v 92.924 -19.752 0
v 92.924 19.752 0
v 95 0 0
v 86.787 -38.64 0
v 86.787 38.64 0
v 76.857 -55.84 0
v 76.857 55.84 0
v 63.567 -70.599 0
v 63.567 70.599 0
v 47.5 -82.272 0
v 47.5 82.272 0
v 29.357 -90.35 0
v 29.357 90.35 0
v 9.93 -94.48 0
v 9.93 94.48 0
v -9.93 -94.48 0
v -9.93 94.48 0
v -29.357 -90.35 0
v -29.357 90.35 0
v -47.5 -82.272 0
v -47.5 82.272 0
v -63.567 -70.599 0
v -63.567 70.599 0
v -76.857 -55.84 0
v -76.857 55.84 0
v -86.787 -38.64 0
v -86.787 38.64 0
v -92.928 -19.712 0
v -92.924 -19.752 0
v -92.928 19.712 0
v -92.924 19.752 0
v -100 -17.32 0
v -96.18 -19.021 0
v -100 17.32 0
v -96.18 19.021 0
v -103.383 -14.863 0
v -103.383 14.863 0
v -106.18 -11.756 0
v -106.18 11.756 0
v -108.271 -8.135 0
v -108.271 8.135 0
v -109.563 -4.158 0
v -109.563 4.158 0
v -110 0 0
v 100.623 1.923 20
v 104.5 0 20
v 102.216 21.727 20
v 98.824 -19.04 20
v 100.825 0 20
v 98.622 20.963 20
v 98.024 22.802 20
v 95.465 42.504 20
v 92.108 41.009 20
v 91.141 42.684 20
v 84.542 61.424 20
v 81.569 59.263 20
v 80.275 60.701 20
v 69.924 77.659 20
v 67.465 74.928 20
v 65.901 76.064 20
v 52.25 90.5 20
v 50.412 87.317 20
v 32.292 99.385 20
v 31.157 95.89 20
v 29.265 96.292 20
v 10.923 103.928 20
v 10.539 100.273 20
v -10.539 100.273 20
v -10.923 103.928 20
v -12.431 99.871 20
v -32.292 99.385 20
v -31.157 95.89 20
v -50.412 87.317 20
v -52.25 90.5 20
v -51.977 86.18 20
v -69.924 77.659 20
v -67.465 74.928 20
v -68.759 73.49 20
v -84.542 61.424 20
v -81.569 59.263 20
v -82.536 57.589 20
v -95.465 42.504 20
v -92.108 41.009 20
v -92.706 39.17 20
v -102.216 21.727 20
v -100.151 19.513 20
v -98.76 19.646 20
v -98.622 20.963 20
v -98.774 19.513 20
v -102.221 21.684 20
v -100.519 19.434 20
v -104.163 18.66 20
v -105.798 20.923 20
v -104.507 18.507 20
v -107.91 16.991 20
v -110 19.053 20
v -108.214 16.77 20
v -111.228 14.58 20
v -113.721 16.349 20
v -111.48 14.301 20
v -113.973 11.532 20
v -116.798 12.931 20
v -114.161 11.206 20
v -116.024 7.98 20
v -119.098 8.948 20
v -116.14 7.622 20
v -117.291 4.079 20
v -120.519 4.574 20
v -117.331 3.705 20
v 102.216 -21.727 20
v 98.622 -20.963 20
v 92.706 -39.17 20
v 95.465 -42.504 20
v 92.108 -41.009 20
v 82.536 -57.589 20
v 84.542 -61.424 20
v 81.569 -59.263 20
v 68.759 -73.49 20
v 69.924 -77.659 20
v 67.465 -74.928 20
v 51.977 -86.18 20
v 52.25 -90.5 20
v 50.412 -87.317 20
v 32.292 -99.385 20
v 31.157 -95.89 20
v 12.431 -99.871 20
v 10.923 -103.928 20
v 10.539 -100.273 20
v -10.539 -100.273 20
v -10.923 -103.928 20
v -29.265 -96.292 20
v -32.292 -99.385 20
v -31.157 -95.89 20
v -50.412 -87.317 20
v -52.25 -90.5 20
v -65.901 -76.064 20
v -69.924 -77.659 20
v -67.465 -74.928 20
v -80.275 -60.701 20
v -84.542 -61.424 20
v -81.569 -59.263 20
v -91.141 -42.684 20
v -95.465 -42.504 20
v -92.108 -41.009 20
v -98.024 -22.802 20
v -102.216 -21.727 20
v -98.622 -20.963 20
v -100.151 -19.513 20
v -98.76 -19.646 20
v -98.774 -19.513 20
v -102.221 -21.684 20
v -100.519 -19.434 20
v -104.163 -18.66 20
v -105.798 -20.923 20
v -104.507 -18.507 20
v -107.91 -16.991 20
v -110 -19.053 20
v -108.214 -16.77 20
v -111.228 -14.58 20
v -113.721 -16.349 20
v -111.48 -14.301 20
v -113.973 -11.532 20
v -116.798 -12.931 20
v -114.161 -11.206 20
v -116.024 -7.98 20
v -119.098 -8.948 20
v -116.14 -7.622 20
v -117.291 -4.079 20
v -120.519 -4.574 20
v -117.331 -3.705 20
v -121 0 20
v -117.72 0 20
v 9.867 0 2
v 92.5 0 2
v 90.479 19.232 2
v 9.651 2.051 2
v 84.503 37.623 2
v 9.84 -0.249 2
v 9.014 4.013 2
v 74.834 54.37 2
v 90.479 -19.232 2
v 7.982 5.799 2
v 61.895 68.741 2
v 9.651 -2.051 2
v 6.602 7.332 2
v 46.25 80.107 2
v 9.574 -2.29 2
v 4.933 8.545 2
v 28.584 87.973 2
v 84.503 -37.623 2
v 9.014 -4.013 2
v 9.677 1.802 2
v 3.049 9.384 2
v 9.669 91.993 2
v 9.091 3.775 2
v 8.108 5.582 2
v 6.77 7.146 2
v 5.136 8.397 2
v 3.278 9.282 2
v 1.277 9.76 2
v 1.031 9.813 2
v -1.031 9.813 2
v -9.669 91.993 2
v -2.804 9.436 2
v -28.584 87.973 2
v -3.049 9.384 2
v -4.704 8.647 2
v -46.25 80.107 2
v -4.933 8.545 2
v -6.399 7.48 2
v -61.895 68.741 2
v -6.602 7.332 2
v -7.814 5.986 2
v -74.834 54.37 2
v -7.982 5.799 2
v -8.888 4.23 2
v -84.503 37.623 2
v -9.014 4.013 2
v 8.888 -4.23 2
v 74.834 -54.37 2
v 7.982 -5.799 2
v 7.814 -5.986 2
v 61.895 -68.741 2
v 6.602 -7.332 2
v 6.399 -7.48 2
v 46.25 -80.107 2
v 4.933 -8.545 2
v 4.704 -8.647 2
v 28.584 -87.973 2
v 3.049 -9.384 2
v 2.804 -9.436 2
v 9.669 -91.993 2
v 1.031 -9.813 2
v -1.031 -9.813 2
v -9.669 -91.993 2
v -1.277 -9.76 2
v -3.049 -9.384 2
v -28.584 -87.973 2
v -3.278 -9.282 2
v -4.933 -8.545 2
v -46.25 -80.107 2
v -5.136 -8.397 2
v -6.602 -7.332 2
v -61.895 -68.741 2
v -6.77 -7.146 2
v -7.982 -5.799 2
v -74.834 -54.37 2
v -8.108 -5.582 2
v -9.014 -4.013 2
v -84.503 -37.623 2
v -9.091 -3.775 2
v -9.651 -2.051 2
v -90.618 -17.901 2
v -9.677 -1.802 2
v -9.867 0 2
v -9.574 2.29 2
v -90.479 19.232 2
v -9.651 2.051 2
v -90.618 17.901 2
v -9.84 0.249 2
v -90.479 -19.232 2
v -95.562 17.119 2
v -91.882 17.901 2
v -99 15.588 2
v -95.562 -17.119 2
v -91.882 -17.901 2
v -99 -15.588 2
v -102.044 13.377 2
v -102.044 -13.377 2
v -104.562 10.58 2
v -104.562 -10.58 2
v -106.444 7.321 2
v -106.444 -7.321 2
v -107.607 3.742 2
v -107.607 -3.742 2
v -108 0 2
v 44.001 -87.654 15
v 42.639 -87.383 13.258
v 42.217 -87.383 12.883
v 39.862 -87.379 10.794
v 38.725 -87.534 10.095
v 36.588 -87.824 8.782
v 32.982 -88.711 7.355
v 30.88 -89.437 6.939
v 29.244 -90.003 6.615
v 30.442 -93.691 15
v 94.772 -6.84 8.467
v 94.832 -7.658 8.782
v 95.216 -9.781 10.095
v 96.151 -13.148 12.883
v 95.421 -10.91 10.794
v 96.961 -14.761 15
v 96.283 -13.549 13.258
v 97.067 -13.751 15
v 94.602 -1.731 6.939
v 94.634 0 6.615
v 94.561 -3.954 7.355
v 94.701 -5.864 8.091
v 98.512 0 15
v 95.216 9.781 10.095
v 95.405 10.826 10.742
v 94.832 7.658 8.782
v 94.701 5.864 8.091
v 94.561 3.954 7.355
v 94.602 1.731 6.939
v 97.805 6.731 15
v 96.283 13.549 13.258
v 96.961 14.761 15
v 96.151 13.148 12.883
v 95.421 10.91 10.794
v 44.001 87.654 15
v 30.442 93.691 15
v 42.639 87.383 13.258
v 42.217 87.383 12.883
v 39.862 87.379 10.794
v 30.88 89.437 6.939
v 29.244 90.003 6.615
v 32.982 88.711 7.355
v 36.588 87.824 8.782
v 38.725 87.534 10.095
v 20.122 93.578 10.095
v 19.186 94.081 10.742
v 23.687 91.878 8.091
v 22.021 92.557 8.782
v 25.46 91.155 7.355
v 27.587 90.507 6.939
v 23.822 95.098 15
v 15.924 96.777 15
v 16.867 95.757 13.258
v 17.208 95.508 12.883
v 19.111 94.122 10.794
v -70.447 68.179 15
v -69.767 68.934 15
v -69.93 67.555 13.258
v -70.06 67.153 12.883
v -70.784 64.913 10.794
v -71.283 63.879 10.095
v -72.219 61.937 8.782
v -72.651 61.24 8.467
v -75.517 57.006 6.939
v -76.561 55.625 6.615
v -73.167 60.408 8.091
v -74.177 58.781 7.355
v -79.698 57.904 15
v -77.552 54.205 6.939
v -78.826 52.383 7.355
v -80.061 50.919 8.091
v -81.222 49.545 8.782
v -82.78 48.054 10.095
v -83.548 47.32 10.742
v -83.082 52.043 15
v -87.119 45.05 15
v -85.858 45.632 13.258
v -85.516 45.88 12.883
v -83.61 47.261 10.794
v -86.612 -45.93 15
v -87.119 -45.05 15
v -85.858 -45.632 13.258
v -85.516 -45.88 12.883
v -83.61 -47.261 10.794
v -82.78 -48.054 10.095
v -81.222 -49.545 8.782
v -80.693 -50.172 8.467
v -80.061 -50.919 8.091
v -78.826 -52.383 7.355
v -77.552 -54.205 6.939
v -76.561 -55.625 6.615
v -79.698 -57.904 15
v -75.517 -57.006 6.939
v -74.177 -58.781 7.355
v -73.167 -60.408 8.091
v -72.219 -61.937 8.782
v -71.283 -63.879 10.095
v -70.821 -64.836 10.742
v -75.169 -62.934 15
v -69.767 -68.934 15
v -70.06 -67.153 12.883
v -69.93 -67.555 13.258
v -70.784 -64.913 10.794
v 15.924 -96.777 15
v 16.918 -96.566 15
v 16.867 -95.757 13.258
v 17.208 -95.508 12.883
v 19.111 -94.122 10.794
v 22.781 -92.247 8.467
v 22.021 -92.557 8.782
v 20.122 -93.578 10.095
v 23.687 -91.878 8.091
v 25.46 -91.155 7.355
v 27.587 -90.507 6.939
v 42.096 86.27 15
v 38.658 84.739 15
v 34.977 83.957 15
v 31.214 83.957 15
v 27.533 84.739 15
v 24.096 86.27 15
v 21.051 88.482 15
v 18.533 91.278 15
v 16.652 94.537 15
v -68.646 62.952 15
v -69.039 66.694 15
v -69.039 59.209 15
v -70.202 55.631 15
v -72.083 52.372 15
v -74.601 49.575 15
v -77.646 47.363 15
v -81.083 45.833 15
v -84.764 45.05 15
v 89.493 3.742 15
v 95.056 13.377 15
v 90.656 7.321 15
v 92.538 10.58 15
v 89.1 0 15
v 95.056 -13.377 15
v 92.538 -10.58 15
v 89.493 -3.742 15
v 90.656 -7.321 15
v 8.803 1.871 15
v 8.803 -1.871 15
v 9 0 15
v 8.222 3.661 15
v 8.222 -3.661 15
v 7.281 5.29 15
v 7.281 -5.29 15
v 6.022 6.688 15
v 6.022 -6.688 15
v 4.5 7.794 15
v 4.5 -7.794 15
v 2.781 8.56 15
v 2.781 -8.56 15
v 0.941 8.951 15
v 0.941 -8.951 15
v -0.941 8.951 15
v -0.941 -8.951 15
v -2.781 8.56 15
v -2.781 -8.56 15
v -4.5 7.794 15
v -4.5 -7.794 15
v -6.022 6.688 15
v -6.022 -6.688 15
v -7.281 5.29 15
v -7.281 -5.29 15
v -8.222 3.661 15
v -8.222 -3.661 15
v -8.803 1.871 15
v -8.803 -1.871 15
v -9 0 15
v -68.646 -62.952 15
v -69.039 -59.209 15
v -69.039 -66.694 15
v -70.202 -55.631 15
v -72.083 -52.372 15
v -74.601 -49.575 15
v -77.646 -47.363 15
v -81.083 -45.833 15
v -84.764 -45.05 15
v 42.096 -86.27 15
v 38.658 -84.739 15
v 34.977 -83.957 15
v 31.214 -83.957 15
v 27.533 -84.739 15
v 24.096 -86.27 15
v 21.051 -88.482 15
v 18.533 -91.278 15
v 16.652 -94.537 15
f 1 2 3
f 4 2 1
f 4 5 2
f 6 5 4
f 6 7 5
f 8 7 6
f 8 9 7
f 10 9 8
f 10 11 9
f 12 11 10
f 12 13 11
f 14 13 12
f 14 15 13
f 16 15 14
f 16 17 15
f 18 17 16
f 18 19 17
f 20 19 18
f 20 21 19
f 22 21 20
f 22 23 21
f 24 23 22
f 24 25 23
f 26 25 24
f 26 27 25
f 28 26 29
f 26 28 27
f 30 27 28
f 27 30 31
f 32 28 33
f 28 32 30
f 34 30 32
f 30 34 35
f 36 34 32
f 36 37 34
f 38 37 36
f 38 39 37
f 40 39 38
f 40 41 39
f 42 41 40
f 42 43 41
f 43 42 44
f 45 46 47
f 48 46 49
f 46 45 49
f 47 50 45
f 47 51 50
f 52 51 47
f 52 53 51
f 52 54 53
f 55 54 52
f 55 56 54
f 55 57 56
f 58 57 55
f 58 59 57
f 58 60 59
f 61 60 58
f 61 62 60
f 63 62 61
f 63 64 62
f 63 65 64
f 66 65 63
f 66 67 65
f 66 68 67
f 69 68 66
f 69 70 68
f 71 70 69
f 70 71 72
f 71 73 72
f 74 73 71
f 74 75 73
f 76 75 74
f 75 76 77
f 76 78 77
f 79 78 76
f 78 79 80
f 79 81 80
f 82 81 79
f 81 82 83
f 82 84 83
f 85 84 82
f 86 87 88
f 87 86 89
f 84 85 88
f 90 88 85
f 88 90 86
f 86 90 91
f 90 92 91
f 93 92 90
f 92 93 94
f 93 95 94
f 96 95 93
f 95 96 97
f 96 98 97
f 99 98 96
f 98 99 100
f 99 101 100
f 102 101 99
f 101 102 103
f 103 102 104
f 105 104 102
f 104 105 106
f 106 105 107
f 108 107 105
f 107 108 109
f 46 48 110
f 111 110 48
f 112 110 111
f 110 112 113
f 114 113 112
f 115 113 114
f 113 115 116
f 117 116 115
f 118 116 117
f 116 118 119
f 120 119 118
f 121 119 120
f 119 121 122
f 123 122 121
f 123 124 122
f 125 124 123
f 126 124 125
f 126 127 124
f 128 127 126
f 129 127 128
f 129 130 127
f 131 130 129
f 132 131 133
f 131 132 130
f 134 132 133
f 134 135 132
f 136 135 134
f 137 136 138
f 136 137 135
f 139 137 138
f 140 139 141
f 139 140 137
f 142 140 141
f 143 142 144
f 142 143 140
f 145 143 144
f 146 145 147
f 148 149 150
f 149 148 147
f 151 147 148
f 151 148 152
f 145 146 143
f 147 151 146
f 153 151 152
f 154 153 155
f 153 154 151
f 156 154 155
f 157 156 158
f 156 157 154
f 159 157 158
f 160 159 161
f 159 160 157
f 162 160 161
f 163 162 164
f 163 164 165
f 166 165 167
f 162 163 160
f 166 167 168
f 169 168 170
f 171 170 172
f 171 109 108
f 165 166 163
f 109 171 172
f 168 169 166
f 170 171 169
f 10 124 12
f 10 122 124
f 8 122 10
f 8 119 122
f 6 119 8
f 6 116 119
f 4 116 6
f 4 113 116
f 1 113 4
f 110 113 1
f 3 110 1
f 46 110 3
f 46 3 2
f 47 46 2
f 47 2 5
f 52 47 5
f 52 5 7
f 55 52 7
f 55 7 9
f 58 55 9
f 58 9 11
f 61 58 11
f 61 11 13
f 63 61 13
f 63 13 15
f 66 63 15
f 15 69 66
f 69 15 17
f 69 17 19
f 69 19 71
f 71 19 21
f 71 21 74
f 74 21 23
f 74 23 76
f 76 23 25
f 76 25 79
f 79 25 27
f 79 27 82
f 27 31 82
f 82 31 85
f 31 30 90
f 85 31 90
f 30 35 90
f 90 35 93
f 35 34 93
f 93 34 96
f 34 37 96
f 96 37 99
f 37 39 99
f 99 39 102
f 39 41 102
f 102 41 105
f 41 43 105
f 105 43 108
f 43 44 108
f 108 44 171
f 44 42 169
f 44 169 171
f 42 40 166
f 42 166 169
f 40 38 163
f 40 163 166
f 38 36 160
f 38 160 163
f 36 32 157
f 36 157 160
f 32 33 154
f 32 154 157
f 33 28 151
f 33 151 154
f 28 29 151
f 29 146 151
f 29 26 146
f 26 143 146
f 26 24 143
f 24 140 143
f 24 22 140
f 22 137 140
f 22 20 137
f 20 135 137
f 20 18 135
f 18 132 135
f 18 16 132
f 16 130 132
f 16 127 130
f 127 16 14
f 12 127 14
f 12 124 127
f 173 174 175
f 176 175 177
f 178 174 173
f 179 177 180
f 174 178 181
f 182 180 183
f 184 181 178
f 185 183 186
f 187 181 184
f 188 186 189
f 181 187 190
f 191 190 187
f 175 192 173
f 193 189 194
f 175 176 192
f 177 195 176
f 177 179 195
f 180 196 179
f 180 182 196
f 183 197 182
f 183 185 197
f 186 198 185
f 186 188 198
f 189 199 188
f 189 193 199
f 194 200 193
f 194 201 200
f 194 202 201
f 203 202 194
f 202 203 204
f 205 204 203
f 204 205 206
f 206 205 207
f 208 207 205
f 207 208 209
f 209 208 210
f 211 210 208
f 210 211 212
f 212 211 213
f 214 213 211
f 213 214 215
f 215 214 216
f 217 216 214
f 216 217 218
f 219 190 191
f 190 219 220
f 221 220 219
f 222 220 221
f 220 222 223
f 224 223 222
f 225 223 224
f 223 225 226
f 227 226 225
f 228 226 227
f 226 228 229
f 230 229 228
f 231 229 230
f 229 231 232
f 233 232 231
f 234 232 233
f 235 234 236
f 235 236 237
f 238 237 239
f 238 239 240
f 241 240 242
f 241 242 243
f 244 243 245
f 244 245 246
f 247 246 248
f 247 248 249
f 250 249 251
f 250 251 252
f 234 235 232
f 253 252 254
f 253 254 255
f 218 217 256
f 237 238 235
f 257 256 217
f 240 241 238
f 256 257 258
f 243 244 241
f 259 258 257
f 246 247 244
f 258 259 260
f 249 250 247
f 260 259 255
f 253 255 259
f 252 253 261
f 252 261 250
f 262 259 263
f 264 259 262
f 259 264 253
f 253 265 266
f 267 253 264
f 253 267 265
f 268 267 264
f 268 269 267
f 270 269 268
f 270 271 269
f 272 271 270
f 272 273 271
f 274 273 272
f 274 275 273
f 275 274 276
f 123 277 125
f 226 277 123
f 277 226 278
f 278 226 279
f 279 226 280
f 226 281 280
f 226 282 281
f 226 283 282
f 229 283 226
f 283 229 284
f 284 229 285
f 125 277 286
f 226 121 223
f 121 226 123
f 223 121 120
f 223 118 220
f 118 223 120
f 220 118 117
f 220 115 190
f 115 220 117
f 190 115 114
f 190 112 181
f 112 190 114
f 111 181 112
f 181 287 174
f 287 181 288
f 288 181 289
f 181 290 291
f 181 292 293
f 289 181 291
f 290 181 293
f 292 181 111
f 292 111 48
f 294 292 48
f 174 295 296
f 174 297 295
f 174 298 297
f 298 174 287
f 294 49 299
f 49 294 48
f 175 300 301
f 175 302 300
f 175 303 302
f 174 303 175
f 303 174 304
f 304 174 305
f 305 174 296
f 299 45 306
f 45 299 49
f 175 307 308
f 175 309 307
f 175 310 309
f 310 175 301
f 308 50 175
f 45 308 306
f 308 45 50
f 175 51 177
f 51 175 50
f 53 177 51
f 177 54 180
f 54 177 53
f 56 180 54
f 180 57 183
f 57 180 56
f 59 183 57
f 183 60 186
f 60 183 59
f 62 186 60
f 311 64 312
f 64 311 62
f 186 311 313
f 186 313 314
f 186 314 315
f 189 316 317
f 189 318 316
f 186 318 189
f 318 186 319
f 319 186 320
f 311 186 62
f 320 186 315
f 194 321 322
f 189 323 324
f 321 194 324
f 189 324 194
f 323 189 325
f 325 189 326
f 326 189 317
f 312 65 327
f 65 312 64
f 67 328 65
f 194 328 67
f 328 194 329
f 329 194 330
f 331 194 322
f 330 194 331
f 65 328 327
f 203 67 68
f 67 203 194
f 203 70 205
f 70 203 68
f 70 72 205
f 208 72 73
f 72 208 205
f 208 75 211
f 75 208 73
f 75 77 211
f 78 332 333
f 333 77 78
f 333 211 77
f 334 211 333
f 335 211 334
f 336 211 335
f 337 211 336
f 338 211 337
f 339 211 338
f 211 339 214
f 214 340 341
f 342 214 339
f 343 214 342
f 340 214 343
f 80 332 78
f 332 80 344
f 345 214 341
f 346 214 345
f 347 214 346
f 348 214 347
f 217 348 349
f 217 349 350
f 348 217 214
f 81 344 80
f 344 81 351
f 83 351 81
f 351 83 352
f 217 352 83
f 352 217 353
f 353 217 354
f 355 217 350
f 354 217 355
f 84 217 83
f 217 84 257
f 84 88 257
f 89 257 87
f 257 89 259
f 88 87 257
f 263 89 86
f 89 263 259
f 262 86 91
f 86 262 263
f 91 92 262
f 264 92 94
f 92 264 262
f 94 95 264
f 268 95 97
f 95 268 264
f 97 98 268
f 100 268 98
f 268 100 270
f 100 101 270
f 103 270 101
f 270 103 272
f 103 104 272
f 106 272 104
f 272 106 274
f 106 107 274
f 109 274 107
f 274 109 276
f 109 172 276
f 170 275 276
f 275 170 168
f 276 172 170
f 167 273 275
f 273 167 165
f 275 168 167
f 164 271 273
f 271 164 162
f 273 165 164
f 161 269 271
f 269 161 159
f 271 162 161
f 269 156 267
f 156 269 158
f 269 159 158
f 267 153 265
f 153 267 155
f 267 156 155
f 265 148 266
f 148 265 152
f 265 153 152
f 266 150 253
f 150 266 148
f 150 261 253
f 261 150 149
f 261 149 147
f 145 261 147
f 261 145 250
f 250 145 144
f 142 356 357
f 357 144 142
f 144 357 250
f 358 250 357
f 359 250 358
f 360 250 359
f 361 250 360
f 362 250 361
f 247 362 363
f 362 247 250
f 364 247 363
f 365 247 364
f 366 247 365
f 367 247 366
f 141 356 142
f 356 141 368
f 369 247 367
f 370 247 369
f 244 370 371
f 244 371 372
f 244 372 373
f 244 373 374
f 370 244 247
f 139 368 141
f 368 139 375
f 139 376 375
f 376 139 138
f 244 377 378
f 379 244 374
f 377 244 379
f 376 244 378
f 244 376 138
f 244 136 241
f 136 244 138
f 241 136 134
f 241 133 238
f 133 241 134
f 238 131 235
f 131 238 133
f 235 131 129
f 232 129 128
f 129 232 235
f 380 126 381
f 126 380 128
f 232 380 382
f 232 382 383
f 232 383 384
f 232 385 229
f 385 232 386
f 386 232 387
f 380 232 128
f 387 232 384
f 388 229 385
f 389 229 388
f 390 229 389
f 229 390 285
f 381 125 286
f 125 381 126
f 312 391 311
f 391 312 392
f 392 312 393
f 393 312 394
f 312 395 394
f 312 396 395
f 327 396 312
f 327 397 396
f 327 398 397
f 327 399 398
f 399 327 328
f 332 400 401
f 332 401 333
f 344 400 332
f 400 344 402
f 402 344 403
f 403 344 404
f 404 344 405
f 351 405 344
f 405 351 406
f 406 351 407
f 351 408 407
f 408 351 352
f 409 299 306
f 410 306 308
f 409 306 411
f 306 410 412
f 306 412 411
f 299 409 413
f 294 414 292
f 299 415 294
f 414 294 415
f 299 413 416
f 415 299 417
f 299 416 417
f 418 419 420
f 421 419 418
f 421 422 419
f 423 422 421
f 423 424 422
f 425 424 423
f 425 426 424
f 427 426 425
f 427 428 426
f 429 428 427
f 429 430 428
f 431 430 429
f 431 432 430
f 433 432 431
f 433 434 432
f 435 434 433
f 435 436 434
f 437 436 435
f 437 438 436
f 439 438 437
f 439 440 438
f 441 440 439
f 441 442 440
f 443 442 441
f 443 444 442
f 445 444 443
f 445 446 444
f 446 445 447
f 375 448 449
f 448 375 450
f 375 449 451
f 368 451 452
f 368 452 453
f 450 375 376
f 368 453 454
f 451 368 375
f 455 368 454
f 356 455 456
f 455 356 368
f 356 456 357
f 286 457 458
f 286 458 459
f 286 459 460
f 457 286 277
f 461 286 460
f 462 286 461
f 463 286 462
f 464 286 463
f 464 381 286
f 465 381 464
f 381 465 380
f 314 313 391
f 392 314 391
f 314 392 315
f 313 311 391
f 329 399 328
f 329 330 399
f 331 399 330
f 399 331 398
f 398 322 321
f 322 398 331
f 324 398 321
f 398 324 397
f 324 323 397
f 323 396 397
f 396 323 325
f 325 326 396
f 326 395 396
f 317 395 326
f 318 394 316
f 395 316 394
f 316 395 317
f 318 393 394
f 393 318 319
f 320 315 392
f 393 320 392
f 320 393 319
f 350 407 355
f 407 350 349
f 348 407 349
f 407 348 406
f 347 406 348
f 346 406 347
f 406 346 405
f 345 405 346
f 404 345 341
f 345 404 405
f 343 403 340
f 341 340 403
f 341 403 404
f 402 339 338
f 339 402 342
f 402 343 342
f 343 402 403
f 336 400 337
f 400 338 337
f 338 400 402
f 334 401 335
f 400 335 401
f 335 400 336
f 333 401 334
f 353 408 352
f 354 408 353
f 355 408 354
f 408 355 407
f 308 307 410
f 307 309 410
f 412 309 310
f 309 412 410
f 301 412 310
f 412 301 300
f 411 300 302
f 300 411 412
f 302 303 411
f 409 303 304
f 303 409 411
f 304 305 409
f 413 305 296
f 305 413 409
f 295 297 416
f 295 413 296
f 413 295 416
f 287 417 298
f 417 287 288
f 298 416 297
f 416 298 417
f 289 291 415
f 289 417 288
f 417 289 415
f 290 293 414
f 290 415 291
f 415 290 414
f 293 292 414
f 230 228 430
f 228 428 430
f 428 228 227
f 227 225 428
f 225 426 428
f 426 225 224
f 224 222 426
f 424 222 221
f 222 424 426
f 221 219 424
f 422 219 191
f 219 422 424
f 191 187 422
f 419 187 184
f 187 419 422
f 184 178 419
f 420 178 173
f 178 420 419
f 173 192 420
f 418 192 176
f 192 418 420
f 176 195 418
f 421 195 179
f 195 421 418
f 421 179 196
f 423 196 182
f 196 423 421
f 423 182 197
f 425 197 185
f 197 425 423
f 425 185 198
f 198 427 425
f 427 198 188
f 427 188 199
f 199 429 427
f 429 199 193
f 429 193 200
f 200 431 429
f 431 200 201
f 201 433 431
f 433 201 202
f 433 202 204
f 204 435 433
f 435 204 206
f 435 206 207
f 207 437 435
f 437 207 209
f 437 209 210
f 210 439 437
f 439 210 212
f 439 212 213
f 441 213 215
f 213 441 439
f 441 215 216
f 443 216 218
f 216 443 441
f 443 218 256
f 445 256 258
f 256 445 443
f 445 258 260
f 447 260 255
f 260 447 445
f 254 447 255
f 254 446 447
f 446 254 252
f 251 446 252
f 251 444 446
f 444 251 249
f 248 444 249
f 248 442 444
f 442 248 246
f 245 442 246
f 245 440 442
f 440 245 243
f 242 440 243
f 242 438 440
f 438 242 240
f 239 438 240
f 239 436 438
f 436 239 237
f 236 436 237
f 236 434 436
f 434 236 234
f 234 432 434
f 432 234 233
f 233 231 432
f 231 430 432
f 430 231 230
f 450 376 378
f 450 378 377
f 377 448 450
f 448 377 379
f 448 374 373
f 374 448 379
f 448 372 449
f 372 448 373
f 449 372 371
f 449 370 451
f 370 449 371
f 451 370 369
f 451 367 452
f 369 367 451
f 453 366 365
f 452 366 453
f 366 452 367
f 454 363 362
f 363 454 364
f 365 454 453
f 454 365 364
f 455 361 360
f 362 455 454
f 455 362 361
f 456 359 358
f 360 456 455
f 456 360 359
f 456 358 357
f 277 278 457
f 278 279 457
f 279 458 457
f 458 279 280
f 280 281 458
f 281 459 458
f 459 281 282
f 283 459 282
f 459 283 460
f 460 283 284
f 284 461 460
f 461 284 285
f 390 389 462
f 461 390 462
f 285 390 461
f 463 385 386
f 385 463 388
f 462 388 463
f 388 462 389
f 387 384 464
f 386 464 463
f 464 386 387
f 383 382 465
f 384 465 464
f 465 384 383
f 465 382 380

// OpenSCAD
//$fn=128;

difference(){
    linear_extrude(height=20,scale=[1.1,1.1]){
        circle(d=190);
        translate([-190/2+5,0,0])circle(d=40);
    }
    translate([0,0,2])linear_extrude(height=20,scale=[1.1,1.1]){
        circle(d=185);
        translate([-190/2+5,0,0])circle(d=36);
    }
}

intersection(){
    translate([0,0,2])linear_extrude(height=20,scale=[1.1,1.1])circle(d=185);
    linear_extrude(height=15,scale=[0.9,0.9]){
        circle(d=20);
        for(i = [1 : 5]){
         rotate(360/5*i)translate([208/2+15,0])circle(d=40);
        }
    }
}

*translate([0,0,15])import("large-bonsai-planter.stl");
